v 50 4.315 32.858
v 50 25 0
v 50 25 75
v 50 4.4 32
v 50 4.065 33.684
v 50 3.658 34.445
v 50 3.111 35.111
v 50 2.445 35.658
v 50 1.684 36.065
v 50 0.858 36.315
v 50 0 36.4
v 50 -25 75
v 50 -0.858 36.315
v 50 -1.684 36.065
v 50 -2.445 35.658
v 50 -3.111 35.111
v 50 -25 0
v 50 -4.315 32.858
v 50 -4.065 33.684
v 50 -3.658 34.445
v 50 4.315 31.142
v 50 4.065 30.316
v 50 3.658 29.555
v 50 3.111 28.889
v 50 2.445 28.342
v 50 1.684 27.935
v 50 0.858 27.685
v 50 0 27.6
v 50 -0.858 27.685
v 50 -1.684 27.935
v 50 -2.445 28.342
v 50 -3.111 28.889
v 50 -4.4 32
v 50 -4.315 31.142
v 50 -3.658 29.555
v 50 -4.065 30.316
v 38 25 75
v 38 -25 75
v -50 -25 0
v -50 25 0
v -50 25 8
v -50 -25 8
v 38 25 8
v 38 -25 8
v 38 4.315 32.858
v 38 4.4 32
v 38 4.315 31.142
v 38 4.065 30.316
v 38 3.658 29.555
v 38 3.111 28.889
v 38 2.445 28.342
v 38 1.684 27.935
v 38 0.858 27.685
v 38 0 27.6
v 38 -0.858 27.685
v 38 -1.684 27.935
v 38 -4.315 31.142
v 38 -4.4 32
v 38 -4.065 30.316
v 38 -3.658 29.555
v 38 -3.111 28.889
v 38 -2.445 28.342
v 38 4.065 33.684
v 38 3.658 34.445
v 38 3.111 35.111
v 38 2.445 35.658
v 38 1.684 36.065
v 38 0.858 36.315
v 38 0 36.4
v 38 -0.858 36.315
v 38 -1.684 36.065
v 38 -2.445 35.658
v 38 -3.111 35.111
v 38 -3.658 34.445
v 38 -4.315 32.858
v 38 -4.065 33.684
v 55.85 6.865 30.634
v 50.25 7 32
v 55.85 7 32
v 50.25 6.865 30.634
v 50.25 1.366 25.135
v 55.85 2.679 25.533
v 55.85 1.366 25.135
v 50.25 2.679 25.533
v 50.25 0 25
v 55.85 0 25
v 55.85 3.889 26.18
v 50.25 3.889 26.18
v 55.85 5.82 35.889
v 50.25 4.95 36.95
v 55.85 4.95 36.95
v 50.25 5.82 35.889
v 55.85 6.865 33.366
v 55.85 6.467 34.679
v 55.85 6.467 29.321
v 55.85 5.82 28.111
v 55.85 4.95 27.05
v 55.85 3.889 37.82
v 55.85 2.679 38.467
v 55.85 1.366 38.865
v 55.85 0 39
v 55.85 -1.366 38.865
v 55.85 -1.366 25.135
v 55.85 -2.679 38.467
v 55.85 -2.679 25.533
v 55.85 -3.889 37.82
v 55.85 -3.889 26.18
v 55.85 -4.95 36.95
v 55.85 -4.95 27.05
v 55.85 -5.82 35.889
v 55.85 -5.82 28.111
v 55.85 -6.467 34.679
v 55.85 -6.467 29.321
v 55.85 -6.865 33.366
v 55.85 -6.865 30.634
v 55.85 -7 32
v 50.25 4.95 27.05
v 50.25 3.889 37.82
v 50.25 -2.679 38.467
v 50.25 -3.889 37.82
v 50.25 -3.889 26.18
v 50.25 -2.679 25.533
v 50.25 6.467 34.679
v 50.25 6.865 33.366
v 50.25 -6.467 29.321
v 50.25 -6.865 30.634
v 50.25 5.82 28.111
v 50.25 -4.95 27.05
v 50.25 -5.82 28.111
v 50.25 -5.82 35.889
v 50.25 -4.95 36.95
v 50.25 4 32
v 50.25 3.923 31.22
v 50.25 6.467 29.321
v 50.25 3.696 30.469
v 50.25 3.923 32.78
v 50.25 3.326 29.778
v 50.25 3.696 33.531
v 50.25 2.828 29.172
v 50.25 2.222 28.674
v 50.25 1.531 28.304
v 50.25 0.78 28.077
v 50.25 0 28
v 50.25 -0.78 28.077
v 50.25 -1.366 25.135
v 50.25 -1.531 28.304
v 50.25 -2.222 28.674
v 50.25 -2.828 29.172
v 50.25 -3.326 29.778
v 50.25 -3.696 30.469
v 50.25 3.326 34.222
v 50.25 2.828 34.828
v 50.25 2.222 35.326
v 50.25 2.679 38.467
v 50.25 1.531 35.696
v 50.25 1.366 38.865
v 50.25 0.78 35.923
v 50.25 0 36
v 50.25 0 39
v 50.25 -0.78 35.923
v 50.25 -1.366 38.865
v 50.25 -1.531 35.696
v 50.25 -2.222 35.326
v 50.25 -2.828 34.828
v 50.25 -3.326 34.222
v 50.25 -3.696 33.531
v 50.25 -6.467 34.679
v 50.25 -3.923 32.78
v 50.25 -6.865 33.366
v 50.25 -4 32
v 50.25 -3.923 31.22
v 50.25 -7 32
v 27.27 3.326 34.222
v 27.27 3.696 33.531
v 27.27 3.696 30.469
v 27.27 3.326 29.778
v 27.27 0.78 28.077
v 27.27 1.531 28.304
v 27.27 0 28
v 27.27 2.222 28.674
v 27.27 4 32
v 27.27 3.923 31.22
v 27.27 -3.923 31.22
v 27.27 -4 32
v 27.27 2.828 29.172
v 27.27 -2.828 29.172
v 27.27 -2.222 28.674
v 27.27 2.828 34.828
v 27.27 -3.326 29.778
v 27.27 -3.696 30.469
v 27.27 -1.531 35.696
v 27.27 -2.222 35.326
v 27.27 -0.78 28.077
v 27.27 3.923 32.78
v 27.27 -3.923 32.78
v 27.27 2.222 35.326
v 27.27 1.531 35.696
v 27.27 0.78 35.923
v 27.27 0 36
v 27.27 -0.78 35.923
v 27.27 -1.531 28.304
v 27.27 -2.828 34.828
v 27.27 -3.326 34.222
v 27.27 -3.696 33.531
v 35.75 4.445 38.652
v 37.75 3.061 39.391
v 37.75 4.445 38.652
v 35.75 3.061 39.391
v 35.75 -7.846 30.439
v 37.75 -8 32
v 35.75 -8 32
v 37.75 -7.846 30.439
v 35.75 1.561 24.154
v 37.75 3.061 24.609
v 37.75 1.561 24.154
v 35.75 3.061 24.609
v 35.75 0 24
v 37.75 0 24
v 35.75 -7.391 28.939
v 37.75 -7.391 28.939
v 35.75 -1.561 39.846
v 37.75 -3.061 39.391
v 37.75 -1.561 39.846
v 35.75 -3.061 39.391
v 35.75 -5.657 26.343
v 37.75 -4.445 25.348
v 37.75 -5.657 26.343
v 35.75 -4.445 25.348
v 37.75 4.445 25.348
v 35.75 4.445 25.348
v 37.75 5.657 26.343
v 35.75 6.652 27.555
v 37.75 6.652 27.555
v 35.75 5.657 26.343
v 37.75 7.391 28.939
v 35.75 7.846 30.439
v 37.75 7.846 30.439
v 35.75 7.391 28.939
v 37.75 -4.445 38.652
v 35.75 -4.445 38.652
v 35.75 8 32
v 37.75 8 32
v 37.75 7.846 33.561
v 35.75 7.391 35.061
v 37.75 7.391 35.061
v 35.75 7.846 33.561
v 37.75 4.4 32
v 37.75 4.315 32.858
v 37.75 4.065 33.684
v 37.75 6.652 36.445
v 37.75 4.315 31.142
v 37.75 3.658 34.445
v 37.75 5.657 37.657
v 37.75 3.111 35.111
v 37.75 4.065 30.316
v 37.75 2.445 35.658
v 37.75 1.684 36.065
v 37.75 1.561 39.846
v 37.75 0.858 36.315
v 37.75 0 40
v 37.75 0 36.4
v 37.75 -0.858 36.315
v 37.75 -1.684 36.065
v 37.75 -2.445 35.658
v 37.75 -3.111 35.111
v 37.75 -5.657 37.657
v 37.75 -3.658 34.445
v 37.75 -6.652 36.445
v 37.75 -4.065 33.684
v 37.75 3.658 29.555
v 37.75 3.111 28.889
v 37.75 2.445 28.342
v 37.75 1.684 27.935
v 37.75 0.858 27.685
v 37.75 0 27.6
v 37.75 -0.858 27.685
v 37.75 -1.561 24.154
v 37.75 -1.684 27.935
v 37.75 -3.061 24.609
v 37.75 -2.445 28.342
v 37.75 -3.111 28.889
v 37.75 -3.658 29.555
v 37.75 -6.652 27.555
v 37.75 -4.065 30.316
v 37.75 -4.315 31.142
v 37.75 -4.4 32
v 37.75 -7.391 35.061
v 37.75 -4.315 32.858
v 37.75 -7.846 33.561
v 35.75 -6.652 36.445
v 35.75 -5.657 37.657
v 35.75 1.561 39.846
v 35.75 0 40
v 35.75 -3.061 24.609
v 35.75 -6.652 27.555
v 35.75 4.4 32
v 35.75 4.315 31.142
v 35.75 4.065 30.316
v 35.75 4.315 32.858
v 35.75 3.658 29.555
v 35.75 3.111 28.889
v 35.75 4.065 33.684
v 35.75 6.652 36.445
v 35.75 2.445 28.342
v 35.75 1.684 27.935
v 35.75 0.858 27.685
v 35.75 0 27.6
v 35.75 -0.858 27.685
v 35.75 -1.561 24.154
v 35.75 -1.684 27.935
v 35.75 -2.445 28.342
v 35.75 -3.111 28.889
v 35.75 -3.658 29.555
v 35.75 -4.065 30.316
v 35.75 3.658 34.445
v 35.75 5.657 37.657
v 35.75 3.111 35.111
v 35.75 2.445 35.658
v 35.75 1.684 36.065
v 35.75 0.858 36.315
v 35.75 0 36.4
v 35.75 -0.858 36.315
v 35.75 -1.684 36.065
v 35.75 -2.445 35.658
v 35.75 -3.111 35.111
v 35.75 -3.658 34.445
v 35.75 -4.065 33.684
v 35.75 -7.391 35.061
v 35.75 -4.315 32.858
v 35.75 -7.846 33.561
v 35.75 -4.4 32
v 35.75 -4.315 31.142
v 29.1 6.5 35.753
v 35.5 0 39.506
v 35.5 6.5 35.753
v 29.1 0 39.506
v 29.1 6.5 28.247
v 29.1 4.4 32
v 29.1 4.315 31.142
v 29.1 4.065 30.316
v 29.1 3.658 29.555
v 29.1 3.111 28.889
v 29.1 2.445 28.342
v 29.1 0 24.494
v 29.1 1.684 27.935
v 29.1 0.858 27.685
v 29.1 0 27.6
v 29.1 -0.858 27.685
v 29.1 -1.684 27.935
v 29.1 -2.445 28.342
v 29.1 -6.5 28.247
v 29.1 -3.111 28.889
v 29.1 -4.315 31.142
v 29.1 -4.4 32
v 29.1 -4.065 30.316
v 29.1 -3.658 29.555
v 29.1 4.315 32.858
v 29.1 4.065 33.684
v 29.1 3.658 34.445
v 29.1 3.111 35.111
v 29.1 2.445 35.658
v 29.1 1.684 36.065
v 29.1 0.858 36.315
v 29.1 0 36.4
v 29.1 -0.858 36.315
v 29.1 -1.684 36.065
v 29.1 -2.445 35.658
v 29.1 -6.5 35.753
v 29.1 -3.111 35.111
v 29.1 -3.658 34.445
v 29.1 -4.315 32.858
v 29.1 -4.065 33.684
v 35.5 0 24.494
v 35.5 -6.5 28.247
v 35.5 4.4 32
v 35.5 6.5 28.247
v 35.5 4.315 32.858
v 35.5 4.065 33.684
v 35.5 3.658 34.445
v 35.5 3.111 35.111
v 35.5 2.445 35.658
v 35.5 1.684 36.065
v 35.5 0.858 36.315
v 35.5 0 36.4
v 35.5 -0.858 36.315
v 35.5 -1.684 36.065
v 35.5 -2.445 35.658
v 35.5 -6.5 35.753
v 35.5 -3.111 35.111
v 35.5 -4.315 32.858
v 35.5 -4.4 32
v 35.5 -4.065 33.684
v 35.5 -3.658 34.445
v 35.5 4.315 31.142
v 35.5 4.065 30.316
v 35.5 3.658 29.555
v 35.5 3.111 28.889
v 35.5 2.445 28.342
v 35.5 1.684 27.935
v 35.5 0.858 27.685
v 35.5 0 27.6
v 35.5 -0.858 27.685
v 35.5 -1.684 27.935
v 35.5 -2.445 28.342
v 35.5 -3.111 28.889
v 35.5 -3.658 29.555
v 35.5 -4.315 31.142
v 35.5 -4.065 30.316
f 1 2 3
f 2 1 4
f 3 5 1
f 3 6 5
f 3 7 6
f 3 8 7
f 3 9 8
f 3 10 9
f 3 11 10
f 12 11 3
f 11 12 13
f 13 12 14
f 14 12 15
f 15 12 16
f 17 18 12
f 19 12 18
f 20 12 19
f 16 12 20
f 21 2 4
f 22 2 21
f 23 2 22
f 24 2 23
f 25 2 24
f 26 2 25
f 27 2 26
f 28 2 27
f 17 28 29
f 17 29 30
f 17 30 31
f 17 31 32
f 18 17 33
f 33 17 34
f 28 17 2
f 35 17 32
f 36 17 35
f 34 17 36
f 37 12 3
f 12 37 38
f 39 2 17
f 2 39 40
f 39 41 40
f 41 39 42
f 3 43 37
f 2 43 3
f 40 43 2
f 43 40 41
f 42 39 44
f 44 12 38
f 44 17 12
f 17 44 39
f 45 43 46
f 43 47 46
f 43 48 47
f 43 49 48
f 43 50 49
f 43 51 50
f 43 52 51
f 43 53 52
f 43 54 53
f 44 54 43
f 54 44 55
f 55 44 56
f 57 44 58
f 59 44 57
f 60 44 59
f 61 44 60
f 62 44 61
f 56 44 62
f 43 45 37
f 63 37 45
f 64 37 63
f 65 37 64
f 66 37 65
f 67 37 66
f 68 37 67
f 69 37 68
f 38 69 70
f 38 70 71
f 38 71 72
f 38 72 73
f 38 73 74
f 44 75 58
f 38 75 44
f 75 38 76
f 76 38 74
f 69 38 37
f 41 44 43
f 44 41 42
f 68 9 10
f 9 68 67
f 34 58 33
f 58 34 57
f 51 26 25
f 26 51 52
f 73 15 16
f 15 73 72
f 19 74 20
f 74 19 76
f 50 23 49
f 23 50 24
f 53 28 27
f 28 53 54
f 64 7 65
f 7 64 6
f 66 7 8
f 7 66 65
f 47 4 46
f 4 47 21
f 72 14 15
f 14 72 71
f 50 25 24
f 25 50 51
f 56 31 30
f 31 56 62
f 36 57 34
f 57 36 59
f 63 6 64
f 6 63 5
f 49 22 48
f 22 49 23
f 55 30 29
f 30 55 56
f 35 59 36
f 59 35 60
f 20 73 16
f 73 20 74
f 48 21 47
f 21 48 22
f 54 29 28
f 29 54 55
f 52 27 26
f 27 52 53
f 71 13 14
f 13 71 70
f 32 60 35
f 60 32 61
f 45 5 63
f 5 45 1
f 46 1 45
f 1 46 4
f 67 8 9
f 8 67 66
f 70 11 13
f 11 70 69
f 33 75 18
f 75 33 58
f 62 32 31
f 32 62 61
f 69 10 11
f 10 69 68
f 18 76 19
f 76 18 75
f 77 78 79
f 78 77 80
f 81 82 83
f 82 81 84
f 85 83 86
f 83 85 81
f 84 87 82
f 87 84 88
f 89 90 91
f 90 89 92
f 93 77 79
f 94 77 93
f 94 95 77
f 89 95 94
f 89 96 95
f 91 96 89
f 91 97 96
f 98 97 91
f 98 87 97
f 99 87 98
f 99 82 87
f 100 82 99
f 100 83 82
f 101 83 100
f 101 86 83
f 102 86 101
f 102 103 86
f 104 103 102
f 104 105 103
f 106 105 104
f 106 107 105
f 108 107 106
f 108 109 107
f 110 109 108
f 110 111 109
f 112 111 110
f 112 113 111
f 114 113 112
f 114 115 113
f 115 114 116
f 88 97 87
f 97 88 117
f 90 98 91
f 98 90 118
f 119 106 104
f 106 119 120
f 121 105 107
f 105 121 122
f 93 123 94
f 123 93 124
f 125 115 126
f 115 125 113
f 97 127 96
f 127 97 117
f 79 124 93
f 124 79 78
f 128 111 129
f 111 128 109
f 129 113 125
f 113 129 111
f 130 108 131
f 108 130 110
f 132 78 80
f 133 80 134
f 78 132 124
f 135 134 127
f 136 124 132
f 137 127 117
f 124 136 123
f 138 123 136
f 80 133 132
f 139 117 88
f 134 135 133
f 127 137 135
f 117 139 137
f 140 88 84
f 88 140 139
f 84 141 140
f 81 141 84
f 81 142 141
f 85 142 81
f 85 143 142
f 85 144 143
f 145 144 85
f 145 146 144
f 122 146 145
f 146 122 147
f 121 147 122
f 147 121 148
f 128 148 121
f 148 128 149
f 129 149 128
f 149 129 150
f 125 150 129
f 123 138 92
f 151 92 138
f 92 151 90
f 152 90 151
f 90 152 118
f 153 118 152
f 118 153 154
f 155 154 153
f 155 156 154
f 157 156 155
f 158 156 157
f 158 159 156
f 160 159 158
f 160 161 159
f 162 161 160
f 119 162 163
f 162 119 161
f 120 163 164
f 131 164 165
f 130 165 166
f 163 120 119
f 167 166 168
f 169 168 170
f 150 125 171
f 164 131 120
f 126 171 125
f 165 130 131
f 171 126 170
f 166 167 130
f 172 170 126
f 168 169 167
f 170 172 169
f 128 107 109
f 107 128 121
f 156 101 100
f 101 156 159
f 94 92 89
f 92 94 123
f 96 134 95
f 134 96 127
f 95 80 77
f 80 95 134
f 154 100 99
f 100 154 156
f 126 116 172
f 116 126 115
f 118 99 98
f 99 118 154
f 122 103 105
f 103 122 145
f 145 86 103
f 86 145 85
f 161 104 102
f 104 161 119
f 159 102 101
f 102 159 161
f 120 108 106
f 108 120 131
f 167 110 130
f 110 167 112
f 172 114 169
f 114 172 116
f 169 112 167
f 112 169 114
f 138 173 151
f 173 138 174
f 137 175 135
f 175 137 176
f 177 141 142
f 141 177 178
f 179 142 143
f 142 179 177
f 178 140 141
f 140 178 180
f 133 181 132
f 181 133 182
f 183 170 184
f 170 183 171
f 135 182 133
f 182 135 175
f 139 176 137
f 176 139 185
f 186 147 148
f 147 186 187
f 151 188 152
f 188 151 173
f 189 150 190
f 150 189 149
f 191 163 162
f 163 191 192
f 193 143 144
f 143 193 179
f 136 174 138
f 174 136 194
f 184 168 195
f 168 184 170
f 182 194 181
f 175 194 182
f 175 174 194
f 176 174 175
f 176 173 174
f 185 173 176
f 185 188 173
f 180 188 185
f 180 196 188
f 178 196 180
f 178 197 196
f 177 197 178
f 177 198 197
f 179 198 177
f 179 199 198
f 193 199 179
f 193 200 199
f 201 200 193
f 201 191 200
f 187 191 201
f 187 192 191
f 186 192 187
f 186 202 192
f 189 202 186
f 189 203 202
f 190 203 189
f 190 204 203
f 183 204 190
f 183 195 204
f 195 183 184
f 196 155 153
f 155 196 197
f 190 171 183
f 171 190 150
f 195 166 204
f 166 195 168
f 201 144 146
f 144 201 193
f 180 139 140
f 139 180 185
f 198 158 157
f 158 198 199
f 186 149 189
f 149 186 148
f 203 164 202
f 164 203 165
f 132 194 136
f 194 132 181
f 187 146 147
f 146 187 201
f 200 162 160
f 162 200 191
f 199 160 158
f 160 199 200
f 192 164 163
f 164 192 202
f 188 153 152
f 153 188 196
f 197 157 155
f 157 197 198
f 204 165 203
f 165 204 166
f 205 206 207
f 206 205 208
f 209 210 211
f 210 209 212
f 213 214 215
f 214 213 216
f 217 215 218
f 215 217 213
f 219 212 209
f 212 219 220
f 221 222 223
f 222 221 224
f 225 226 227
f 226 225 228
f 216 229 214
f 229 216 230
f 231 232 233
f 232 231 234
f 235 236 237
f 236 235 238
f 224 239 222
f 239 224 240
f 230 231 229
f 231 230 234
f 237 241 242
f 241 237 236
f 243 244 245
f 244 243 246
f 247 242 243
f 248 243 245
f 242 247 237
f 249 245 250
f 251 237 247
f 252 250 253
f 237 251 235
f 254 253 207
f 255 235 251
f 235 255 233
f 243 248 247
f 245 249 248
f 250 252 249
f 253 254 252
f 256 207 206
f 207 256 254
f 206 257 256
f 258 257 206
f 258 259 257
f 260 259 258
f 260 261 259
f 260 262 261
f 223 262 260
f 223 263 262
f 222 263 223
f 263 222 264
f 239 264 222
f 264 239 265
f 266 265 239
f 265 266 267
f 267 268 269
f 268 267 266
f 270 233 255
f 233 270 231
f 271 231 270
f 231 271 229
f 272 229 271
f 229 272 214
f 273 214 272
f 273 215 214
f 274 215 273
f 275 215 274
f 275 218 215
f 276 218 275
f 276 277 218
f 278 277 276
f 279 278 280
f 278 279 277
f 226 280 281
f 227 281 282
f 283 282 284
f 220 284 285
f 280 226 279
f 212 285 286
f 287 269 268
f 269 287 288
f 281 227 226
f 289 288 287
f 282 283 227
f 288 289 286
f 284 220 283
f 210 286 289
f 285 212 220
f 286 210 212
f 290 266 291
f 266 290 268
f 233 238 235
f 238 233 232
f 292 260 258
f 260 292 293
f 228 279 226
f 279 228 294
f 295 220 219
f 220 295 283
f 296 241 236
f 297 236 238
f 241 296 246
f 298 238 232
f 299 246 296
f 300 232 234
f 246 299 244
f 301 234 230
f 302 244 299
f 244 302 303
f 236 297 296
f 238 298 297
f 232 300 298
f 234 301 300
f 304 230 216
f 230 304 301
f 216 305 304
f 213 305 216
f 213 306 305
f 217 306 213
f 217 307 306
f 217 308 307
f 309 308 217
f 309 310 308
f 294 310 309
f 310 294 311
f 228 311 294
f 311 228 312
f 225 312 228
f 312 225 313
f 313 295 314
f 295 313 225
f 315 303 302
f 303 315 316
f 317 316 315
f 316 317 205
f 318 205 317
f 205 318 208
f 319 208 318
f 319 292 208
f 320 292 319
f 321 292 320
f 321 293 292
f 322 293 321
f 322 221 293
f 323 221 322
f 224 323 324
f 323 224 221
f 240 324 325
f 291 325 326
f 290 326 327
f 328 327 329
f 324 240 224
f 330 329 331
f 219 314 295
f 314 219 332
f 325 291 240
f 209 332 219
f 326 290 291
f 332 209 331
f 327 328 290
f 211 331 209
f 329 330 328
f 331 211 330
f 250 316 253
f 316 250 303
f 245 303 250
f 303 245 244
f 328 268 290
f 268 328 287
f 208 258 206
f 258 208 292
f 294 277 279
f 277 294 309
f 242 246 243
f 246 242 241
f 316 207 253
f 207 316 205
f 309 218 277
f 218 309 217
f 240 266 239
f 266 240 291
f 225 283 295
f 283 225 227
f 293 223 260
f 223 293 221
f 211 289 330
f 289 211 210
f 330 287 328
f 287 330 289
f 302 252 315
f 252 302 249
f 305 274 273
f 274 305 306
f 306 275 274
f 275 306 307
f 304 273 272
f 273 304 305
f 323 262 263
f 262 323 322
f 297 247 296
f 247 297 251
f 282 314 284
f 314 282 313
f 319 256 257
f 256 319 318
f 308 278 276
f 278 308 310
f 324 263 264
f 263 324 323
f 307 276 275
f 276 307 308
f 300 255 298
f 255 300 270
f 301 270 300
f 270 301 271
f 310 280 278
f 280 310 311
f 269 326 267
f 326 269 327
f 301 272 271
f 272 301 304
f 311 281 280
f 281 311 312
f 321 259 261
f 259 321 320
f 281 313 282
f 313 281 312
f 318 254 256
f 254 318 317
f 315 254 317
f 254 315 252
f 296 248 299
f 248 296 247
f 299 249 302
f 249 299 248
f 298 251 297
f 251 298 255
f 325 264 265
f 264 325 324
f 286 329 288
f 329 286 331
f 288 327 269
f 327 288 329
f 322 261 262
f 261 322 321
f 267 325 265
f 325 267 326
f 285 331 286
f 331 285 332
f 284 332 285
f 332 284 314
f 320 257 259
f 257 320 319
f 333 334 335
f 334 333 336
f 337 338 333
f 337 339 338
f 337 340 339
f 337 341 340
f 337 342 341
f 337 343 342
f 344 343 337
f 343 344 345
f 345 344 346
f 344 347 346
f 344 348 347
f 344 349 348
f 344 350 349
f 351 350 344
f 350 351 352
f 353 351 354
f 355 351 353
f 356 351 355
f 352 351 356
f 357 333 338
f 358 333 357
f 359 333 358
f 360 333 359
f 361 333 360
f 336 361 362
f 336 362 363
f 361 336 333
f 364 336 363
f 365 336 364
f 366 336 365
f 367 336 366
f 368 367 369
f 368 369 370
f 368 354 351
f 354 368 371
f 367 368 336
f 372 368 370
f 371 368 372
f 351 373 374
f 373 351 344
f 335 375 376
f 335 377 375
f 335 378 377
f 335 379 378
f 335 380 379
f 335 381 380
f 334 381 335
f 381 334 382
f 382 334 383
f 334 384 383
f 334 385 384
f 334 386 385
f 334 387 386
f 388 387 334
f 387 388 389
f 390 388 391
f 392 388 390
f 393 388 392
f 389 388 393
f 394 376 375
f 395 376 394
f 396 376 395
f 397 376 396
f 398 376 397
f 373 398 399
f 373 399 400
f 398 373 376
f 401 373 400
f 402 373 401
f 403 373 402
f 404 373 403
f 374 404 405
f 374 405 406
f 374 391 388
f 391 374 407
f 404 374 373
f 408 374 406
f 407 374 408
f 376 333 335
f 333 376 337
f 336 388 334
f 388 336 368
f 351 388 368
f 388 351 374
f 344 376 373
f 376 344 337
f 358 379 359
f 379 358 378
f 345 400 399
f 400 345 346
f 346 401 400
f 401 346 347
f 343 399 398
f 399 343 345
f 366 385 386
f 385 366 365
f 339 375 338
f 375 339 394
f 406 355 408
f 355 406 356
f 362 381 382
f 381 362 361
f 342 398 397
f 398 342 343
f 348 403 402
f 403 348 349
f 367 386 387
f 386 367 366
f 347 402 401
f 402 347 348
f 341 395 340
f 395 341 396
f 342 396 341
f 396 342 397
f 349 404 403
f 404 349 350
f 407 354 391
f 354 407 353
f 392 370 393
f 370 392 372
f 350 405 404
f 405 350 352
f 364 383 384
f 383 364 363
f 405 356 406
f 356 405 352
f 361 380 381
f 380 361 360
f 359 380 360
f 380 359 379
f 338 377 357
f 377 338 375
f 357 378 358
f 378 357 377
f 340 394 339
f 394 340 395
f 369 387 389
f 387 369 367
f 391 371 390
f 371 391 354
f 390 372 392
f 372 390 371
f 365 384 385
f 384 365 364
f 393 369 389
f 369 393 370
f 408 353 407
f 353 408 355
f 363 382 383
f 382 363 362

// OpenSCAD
$fn = 32;

// ------------------------------------------------------------------------
// Bolted bracket: 100 x 50 mm bracket with 1 bolt joints
// Every part is its own module, assembly() places them once.
// ------------------------------------------------------------------------

// --- part 1 ---
module bracket() {
  difference() {
    translate([-50, -25, 0]) cube([100, 50, 75]);
    translate([-51, -26, 8]) cube([89, 52, 68]);
    translate([44, 0, 32]) rotate([0, 90, 0]) cylinder(h = 14, d = 8.8, center = true);
  }
}

// --- part 2 ---
module bolt() {
  cylinder(h = 5.6, d = 14);
  translate([0, 0, -22.98]) cylinder(h = 22.98, d = 8);
}

// --- part 3 ---
module washer() {
  difference() {
      translate([0, 0, 0]) cylinder(h = 2, d = 16);
      translate([0, 0, -1]) cylinder(h = 4, d = 8.8);
    }
}

// --- part 4 ---
module nut() {
  difference() {
    linear_extrude(height = 6.4) polygon(points = [[7.506, 0], [3.753, 6.5], [-3.753, 6.5], [-7.506, 0], [-3.753, -6.5], [3.753, -6.5]]);
    translate([0, 0, -1]) cylinder(h = 8.4, d = 8.8);
  }
}

// --- assembly ---
module assembly() {
  translate([0, 0, 0]) rotate([0, 0, 0]) bracket();
  translate([50.25, 0, 32]) rotate([0, 90, 0]) bolt();
  translate([35.75, 0, 32]) rotate([0, 90, 0]) washer();
  translate([29.1, 0, 32]) rotate([0, 90, 0]) nut();
}

assembly();
